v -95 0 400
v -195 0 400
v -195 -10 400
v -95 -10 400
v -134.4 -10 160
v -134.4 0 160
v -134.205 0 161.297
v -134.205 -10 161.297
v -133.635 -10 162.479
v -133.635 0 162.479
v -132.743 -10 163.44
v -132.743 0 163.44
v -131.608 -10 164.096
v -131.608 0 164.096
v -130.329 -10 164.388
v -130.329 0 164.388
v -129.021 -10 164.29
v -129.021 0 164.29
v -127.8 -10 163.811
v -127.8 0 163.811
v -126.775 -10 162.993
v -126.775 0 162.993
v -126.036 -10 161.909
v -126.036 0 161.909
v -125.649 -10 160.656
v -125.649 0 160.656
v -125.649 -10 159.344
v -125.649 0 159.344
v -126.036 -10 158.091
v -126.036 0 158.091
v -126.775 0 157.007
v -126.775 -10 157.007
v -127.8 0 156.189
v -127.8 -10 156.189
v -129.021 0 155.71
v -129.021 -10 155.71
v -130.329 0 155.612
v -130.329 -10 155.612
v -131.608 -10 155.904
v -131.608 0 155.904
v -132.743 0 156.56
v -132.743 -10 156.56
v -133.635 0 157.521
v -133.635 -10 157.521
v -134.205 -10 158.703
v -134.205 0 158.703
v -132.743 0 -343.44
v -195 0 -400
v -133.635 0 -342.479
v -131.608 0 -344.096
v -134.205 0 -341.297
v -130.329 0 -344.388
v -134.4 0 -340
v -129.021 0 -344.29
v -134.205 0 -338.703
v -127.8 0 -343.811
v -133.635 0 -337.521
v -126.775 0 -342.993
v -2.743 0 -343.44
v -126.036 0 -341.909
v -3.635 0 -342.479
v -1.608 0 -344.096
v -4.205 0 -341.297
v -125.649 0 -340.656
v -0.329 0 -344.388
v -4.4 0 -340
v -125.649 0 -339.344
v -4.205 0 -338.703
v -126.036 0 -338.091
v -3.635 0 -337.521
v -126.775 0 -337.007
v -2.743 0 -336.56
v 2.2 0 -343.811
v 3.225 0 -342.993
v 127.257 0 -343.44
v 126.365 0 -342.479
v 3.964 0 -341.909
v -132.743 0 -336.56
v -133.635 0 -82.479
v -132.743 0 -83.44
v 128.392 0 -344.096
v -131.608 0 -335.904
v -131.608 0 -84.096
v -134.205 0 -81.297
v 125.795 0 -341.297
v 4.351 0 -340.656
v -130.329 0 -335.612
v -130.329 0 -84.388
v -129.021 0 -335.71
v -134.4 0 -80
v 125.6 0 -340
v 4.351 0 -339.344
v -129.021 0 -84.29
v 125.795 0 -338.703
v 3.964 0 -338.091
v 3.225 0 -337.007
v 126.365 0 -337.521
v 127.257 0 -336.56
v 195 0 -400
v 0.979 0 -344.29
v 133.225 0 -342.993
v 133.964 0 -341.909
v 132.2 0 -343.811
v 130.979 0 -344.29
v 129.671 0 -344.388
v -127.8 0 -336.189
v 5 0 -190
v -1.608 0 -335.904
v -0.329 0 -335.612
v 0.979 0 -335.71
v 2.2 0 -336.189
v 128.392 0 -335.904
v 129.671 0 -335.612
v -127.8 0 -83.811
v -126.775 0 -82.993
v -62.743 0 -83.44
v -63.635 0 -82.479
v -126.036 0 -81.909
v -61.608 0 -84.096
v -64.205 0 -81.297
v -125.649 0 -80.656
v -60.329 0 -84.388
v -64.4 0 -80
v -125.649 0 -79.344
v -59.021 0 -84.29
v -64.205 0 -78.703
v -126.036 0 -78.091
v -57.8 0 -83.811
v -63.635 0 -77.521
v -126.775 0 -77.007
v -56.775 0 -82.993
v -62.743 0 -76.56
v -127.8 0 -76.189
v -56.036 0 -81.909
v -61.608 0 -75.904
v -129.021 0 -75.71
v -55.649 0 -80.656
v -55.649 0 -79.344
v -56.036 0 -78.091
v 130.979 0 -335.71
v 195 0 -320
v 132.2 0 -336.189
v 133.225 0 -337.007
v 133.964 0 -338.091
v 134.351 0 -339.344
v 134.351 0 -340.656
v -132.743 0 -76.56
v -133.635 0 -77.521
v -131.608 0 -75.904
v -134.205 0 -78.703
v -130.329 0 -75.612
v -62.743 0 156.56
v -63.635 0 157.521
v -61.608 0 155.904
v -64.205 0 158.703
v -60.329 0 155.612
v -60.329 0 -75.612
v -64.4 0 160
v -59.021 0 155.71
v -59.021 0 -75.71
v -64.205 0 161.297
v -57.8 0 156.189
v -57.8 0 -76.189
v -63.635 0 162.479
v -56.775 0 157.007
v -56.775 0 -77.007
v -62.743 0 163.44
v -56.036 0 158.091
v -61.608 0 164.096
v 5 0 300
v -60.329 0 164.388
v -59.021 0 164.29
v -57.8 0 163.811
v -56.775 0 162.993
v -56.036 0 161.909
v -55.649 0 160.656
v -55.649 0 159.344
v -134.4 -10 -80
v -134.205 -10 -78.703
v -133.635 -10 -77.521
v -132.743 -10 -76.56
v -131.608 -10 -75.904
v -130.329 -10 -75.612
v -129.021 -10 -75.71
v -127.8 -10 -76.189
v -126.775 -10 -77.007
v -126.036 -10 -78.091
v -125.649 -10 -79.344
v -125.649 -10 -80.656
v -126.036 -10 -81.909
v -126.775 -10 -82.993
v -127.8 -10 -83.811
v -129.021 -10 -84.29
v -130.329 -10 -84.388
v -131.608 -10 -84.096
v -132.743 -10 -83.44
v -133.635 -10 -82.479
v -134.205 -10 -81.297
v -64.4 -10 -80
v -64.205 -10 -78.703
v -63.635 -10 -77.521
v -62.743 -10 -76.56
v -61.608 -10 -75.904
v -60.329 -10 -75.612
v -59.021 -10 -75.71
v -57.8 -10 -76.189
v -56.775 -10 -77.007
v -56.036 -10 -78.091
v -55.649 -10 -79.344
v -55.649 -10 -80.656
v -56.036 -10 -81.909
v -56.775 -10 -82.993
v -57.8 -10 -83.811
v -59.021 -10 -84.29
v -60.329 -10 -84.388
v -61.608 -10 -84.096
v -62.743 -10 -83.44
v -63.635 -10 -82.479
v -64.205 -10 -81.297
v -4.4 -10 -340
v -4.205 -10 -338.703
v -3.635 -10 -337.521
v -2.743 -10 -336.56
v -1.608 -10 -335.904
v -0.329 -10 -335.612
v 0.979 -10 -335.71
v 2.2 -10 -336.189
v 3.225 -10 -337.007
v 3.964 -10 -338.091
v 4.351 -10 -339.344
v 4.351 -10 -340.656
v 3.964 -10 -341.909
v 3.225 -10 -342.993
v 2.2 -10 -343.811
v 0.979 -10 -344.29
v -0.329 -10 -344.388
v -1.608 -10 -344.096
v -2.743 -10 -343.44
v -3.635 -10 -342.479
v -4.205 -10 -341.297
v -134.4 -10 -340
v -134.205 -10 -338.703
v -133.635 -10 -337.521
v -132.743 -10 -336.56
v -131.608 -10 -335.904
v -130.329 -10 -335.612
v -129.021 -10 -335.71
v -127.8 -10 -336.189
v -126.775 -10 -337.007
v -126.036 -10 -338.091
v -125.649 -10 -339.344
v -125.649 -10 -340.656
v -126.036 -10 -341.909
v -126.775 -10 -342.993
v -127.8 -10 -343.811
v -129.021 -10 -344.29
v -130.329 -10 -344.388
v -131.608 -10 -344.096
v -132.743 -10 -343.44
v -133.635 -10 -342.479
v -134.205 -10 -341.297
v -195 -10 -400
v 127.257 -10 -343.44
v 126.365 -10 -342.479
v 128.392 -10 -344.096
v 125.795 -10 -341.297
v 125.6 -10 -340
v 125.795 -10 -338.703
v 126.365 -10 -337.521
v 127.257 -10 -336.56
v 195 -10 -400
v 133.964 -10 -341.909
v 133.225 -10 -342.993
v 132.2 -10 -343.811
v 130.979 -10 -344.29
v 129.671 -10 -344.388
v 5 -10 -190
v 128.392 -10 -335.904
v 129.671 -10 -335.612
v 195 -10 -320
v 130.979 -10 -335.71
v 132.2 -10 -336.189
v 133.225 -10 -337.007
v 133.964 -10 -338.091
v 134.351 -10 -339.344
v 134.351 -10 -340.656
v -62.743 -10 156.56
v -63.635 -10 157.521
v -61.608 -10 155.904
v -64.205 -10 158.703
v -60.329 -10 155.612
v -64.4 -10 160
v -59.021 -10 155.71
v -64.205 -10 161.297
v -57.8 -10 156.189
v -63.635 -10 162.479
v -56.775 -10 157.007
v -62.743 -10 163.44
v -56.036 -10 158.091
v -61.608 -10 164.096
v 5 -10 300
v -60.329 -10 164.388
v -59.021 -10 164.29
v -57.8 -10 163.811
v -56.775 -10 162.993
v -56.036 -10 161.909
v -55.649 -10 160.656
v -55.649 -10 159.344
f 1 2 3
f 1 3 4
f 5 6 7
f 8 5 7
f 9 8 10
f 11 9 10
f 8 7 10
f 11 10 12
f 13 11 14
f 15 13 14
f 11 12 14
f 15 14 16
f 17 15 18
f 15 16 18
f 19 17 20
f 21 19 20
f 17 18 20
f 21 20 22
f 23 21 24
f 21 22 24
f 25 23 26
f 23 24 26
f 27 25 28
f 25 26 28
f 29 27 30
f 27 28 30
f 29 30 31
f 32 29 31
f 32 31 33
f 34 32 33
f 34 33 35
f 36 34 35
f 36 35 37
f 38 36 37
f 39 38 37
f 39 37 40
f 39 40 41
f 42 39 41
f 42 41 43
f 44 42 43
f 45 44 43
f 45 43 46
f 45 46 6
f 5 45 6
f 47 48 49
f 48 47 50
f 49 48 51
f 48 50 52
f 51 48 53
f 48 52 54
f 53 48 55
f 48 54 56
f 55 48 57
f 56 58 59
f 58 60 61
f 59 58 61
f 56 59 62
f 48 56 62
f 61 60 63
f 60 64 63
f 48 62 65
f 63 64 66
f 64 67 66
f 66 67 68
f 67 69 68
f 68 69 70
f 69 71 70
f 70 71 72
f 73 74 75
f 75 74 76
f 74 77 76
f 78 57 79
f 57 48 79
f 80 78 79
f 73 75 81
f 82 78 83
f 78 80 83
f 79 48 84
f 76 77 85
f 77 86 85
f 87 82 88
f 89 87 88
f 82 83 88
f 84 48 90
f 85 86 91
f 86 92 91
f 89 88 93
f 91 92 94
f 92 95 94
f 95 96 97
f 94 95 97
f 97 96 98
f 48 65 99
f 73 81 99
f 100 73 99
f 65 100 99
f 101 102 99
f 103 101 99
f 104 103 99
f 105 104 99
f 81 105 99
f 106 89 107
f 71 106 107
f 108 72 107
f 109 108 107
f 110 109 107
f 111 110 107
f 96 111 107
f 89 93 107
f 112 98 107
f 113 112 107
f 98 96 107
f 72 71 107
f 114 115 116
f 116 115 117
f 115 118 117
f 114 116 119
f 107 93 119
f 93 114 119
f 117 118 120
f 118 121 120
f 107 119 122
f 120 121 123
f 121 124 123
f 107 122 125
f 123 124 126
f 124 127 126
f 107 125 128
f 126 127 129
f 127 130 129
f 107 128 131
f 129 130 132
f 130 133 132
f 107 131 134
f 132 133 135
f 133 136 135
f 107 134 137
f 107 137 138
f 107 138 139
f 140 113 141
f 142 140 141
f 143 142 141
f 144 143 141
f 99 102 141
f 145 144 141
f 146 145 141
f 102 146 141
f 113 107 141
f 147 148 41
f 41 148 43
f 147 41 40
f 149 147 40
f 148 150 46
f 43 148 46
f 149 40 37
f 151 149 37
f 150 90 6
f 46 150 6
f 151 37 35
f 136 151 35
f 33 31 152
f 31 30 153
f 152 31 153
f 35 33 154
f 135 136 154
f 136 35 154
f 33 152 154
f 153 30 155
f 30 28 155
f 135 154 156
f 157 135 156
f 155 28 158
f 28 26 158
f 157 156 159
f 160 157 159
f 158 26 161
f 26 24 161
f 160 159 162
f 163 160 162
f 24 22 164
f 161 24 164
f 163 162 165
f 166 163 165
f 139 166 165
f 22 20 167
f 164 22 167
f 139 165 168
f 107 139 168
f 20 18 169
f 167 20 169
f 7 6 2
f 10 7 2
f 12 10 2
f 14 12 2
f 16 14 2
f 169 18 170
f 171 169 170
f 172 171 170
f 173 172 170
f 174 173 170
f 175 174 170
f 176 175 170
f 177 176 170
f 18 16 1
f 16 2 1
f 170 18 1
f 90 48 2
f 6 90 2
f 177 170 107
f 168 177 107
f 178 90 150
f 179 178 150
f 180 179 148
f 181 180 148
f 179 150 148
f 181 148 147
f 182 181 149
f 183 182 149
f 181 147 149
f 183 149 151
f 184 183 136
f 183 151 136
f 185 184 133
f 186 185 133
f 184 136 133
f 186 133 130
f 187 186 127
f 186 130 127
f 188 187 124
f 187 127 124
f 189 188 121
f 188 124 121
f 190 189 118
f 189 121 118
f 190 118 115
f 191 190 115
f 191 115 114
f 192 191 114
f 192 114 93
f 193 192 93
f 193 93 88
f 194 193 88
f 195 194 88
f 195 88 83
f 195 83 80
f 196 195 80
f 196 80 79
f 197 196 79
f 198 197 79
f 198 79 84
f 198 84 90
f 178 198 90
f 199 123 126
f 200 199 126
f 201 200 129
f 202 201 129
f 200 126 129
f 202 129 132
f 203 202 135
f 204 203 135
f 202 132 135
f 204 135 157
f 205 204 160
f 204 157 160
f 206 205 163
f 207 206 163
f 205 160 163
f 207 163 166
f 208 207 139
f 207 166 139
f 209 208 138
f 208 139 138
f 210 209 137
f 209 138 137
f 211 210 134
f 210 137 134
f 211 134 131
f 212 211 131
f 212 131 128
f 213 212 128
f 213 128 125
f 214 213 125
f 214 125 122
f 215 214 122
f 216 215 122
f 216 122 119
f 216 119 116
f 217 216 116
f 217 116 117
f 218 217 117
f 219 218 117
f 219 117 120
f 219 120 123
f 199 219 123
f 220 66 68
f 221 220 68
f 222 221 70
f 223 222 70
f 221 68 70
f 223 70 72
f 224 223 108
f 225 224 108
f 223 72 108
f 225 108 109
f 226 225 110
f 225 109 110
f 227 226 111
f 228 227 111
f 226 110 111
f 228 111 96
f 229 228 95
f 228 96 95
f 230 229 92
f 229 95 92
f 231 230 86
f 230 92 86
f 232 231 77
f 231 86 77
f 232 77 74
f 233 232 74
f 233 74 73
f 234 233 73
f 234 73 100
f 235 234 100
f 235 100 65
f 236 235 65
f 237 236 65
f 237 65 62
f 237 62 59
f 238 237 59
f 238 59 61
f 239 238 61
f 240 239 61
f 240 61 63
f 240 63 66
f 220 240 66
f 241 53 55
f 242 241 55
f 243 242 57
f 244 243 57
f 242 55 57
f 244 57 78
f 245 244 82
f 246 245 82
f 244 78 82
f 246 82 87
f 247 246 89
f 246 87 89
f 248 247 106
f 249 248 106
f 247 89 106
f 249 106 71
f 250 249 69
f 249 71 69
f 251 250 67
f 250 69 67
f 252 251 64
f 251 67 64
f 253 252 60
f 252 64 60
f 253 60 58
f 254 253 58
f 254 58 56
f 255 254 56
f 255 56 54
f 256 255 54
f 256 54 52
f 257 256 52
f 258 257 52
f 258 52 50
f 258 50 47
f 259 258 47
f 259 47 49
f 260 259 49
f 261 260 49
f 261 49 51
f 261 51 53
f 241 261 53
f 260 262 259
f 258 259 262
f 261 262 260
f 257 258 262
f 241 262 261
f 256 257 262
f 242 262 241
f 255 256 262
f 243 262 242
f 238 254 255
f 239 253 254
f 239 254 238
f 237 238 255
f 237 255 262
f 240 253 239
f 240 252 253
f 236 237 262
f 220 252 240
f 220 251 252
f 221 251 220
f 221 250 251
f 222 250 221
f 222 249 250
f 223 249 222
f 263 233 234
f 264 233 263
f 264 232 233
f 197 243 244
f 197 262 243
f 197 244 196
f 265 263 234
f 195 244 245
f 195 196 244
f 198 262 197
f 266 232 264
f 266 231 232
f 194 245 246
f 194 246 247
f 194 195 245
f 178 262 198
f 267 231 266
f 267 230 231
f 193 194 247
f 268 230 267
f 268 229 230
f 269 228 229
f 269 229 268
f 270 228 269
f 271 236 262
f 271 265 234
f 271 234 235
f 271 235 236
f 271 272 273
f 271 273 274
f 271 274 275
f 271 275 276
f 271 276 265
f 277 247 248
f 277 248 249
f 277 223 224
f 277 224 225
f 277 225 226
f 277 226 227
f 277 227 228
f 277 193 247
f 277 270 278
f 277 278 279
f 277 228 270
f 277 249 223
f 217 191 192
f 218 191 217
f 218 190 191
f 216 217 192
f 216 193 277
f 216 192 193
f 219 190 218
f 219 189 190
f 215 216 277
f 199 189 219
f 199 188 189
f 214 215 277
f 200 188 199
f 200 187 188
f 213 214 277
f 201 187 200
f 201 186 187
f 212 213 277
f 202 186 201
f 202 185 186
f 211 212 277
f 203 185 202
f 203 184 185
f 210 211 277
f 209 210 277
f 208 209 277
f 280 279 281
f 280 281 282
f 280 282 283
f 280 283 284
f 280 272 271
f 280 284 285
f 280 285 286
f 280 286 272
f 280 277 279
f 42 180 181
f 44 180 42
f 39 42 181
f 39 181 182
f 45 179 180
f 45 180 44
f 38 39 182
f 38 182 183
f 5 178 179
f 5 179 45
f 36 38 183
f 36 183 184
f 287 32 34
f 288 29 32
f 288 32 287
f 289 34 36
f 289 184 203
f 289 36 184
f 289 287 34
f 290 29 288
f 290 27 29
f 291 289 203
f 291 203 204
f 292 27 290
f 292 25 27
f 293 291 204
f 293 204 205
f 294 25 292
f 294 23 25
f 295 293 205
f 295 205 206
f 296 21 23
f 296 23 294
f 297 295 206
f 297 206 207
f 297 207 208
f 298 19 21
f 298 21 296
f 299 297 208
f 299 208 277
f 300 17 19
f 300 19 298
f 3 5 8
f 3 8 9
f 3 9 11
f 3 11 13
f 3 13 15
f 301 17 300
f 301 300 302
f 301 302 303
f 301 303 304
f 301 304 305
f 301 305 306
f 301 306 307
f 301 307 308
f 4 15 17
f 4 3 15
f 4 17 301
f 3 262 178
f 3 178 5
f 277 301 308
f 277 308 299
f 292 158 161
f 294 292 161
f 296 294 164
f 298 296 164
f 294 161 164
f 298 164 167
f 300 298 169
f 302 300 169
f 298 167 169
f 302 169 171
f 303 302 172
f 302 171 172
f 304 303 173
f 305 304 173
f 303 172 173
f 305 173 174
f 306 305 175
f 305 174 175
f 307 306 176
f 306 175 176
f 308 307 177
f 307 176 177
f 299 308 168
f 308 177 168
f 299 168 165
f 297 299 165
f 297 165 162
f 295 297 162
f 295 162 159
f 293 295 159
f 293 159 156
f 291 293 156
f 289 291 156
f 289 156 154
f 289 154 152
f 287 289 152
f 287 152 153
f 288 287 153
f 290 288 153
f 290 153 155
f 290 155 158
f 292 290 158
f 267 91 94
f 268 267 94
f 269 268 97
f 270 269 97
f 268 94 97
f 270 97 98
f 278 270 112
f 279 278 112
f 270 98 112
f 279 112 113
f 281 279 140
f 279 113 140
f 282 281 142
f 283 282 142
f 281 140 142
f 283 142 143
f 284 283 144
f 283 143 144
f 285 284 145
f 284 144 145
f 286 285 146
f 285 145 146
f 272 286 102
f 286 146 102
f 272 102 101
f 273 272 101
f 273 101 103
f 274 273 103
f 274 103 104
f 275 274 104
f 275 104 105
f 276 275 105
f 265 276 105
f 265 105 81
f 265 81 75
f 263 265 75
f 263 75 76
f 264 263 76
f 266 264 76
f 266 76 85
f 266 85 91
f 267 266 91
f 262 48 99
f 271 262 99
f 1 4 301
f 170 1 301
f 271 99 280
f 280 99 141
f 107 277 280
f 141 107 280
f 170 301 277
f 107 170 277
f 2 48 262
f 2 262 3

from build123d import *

# Parameters (mm, degrees)
F0_W     = 390
F0_H     = 800
F1_DEPTH = 10
F3_DEPTH = 25
F5_D     = 8.8


with BuildPart() as f1:
    # F0 (on Front) → F1 (new body)
    with BuildSketch(Plane.XZ):
        Rectangle(F0_W, F0_H)
    extrude(amount=F1_DEPTH)

    # F2 (on face) → F3 (cut)
    with BuildSketch(Plane.XZ.offset(10)):
        Polygon((5, -190), (195, -320), (195, 400), (-95, 400), (5, 300), align=None)
    extrude(amount=-F3_DEPTH, mode=Mode.SUBTRACT)

    # F5 (through all)
    with Locations(Plane.XZ.offset(10)):
        with Locations((-130, 160), (-60, 160), (-130, -80), (-60, -80), (-130, -340), (0, -340), (130, -340)):
            Hole(F5_D / 2)


solid = f1.part
